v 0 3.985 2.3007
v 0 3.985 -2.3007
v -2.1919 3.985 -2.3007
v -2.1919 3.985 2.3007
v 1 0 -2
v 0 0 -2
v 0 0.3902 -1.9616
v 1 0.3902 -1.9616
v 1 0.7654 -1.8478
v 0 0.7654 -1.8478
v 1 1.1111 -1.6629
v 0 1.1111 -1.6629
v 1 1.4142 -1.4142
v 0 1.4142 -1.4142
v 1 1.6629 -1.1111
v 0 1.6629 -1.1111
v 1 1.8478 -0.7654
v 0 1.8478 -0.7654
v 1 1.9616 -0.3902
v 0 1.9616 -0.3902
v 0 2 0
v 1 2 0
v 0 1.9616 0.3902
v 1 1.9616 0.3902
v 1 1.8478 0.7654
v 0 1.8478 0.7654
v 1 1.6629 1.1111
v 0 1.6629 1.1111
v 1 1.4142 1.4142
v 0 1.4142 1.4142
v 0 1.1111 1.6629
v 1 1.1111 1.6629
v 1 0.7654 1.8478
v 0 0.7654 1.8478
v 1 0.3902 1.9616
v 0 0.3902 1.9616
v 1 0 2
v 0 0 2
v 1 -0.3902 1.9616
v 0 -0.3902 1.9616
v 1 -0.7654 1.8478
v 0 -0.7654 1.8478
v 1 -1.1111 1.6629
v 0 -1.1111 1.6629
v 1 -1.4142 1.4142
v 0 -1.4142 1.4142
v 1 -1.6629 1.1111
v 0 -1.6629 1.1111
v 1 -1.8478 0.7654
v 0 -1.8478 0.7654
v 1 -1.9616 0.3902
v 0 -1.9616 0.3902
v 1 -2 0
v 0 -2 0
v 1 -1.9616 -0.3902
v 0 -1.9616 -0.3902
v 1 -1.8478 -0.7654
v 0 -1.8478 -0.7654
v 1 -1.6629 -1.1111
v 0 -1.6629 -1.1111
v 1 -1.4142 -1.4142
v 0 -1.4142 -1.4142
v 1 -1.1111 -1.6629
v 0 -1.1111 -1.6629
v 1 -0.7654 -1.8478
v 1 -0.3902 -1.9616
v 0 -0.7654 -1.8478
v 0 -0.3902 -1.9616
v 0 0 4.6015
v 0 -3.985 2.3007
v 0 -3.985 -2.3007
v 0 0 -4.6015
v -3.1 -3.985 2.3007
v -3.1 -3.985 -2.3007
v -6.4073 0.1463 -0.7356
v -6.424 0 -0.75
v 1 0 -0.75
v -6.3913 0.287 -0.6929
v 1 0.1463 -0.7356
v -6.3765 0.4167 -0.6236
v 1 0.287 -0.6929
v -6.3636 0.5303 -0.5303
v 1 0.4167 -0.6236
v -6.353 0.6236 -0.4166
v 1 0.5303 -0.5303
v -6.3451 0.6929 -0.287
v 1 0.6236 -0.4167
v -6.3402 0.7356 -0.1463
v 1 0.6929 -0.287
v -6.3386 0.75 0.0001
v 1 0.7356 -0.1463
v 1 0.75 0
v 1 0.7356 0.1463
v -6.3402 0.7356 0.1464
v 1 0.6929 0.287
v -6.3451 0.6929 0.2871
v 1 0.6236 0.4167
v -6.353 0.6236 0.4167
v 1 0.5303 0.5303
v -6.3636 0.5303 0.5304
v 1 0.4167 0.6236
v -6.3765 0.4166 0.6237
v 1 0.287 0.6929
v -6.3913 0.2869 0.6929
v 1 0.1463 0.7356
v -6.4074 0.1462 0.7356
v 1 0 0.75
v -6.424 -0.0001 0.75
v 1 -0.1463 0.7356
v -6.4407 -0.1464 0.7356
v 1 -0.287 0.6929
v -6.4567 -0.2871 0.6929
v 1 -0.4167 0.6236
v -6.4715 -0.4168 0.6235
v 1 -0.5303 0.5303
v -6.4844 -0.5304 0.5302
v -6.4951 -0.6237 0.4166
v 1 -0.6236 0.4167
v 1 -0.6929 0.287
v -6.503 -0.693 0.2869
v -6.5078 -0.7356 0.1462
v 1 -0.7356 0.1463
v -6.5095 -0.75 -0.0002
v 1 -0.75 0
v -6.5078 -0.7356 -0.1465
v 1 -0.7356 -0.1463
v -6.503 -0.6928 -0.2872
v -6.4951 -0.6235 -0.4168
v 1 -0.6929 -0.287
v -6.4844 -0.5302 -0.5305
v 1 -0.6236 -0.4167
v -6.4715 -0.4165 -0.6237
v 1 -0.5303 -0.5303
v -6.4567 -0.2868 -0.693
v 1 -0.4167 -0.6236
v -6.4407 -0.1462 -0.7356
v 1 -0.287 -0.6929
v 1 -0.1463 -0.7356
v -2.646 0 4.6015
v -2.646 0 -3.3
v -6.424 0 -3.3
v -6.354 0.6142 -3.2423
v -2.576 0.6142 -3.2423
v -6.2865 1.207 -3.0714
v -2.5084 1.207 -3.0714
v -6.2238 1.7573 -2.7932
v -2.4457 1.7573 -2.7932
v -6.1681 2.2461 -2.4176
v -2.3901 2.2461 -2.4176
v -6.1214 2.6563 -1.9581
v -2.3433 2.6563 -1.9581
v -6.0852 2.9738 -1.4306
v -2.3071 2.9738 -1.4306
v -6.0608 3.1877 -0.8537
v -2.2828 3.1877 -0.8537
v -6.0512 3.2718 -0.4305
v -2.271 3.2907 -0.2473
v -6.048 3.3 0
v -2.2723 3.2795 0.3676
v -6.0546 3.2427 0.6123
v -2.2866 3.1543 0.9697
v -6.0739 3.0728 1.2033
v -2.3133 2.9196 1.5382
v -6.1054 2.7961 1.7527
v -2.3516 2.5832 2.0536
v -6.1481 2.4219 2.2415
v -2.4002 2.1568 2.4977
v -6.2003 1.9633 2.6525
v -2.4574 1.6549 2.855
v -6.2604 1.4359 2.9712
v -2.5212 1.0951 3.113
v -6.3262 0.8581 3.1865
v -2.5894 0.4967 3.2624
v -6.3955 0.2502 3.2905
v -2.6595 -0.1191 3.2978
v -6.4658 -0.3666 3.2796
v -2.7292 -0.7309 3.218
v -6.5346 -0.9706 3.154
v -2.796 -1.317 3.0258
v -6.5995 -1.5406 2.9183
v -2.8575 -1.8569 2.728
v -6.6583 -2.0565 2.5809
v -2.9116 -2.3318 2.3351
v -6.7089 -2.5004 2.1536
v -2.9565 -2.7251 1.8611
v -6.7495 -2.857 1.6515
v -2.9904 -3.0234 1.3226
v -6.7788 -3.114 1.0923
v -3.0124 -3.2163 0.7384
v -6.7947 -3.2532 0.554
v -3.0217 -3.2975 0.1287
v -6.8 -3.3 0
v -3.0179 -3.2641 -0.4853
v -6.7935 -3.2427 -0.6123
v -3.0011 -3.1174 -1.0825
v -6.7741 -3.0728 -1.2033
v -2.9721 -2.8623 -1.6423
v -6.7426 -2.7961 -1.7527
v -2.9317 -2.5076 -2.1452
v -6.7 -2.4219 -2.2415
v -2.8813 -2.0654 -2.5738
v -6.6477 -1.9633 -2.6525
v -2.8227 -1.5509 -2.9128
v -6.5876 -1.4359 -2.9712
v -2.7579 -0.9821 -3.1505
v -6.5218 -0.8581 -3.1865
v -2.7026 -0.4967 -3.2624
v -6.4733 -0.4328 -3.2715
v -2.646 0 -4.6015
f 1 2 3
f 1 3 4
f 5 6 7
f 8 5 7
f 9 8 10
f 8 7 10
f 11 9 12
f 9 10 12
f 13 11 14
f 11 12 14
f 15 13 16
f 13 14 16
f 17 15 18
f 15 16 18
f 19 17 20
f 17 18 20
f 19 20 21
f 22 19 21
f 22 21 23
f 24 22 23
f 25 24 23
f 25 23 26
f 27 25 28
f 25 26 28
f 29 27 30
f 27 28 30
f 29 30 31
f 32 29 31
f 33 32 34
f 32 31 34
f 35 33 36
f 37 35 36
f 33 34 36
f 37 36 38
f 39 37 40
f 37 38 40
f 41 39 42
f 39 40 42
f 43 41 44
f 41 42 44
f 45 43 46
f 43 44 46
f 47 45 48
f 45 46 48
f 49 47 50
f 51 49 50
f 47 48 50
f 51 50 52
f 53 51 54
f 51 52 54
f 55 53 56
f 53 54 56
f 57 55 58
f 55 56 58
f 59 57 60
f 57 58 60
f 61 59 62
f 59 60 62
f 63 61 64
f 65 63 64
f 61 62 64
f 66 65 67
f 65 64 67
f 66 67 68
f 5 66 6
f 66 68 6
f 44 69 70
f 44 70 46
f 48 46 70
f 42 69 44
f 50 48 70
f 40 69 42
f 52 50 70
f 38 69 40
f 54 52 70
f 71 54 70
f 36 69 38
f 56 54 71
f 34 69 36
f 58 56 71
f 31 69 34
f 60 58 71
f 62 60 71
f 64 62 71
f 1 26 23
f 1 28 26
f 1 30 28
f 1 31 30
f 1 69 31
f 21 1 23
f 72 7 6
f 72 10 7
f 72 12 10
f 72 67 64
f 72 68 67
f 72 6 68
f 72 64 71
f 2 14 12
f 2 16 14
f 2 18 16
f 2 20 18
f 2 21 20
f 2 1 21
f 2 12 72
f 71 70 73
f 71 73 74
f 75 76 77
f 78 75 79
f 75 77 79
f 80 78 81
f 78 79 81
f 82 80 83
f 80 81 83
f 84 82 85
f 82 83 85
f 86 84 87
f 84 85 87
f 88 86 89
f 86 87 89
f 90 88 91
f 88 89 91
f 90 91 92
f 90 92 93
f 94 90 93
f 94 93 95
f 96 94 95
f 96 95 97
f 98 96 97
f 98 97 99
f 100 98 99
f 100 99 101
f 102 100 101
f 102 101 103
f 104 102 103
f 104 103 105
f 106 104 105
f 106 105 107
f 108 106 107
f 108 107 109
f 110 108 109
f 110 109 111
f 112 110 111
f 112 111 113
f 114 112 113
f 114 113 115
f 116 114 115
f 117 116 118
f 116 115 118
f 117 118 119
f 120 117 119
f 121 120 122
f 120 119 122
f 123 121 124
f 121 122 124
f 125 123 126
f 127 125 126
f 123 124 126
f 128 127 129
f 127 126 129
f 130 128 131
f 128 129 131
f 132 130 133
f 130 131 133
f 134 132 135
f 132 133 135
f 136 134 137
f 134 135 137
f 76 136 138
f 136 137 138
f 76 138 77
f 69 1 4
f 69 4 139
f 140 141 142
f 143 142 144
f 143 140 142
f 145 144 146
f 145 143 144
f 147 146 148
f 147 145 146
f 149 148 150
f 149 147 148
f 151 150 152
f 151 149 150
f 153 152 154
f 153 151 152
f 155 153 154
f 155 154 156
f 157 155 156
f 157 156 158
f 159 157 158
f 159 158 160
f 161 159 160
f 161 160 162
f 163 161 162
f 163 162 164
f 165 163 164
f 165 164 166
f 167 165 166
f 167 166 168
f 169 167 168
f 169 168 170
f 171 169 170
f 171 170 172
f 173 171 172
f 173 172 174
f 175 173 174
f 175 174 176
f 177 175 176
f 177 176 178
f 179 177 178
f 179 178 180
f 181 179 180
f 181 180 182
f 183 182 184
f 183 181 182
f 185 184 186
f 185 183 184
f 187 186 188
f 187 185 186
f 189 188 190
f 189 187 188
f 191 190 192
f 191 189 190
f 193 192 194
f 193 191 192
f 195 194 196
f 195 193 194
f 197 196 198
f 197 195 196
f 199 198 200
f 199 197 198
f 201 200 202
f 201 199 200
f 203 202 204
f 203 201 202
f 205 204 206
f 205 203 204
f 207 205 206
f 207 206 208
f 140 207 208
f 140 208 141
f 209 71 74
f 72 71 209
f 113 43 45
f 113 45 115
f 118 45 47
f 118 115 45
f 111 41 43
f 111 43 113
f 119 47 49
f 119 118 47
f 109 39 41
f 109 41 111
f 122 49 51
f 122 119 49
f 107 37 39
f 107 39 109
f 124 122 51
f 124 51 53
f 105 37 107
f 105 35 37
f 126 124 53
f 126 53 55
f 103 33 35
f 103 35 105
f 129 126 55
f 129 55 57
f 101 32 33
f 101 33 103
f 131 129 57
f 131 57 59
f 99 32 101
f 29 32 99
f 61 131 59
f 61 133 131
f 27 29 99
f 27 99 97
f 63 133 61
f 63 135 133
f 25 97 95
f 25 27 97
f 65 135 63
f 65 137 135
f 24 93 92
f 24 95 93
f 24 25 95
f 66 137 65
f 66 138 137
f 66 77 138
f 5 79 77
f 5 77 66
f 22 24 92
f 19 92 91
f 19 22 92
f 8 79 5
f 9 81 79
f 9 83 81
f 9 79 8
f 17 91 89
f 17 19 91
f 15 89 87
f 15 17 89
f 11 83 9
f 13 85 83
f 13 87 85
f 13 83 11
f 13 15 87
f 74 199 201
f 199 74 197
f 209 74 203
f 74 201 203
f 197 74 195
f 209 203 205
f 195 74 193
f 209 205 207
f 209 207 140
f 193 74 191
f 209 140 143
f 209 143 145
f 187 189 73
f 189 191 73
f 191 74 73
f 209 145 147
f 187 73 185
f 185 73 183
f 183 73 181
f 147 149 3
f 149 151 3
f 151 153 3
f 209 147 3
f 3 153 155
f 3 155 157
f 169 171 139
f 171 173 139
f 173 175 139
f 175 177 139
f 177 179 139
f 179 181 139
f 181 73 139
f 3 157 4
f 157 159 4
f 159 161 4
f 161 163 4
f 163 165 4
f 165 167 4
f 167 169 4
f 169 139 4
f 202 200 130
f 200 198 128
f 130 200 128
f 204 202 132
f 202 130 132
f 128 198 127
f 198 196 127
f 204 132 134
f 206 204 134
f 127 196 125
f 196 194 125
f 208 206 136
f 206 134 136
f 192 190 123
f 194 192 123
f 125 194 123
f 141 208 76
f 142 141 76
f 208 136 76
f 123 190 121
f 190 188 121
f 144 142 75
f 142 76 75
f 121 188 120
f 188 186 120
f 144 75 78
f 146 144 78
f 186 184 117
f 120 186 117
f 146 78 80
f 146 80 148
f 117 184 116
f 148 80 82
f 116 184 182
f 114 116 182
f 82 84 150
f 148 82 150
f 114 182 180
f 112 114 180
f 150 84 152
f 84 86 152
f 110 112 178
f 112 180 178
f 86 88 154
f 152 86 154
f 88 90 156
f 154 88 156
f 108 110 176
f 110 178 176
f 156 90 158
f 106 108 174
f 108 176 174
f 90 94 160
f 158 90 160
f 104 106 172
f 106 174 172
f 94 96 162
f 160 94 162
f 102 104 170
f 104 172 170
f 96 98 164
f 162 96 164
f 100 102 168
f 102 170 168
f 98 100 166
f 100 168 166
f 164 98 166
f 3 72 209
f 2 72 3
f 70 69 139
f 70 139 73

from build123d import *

# Parameters (mm, degrees)
SALIENTE_EXTRUIR1_DEPTH = 3.1
CORTAR_EXTRUIR1_DEPTH   = 16.5
CROQUIS3_R              = 3.3
SALIENTE_EXTRUIR2_DEPTH = 6.8
CORTAR_EXTRUIR2_DEPTH   = 3.4
CROQUIS5_R              = 2
SALIENTE_EXTRUIR3_DEPTH = 1
CROQUIS6_R              = 0.75
CORTAR_EXTRUIR3_DEPTH   = 10.894132521


with BuildPart() as part:
    # Croquis1 → Saliente-Extruir1 (new body)
    with BuildSketch(Plane(origin=(0, 0, 0), x_dir=(0, 0, -1), z_dir=(1, 0, 0))):
        Polygon((-4.601481645, 0), (-2.300740823, -3.985), (2.300740823, -3.985), (4.601481645, 0), (2.300740823, 3.985), (-2.300740823, 3.985), align=None)
    extrude(amount=-SALIENTE_EXTRUIR1_DEPTH)

    # Croquis2 → Cortar-Extruir1 (cut, symmetric)
    with BuildSketch(Plane.XY):
        Polygon((-3.1, -3.985), (-2.191933202, 3.985), (-3.527931865, 3.985), align=None)
    extrude(amount=CORTAR_EXTRUIR1_DEPTH, both=True, mode=Mode.SUBTRACT)

    # Croquis3 → Saliente-Extruir2 (add)
    with BuildSketch(Plane(origin=(0, 0, 0), x_dir=(0, 0, -1), z_dir=(1, 0, 0))):
        Circle(CROQUIS3_R)
    extrude(amount=-SALIENTE_EXTRUIR2_DEPTH)

    # Croquis4 → Cortar-Extruir2 (cut, symmetric)
    with BuildSketch(Plane.XY):
        Polygon((-6.8, -3.3), (-6.048024985, 3.3), (-6.8, 3.3), align=None)
    extrude(amount=CORTAR_EXTRUIR2_DEPTH, both=True, mode=Mode.SUBTRACT)

    # Croquis5 → Saliente-Extruir3 (add)
    with BuildSketch(Plane(origin=(0, 0, 0), x_dir=(0, 0, -1), z_dir=(1, 0, 0))):
        Circle(CROQUIS5_R)
    extrude(amount=SALIENTE_EXTRUIR3_DEPTH)

    # Croquis6 → Cortar-Extruir3 (cut, through all)
    with BuildSketch(Plane(origin=(1, 0, 0), x_dir=(0, 0, -1), z_dir=(1, 0, 0))):
        Circle(CROQUIS6_R)
    extrude(amount=-CORTAR_EXTRUIR3_DEPTH, mode=Mode.SUBTRACT)


solid = part.part
